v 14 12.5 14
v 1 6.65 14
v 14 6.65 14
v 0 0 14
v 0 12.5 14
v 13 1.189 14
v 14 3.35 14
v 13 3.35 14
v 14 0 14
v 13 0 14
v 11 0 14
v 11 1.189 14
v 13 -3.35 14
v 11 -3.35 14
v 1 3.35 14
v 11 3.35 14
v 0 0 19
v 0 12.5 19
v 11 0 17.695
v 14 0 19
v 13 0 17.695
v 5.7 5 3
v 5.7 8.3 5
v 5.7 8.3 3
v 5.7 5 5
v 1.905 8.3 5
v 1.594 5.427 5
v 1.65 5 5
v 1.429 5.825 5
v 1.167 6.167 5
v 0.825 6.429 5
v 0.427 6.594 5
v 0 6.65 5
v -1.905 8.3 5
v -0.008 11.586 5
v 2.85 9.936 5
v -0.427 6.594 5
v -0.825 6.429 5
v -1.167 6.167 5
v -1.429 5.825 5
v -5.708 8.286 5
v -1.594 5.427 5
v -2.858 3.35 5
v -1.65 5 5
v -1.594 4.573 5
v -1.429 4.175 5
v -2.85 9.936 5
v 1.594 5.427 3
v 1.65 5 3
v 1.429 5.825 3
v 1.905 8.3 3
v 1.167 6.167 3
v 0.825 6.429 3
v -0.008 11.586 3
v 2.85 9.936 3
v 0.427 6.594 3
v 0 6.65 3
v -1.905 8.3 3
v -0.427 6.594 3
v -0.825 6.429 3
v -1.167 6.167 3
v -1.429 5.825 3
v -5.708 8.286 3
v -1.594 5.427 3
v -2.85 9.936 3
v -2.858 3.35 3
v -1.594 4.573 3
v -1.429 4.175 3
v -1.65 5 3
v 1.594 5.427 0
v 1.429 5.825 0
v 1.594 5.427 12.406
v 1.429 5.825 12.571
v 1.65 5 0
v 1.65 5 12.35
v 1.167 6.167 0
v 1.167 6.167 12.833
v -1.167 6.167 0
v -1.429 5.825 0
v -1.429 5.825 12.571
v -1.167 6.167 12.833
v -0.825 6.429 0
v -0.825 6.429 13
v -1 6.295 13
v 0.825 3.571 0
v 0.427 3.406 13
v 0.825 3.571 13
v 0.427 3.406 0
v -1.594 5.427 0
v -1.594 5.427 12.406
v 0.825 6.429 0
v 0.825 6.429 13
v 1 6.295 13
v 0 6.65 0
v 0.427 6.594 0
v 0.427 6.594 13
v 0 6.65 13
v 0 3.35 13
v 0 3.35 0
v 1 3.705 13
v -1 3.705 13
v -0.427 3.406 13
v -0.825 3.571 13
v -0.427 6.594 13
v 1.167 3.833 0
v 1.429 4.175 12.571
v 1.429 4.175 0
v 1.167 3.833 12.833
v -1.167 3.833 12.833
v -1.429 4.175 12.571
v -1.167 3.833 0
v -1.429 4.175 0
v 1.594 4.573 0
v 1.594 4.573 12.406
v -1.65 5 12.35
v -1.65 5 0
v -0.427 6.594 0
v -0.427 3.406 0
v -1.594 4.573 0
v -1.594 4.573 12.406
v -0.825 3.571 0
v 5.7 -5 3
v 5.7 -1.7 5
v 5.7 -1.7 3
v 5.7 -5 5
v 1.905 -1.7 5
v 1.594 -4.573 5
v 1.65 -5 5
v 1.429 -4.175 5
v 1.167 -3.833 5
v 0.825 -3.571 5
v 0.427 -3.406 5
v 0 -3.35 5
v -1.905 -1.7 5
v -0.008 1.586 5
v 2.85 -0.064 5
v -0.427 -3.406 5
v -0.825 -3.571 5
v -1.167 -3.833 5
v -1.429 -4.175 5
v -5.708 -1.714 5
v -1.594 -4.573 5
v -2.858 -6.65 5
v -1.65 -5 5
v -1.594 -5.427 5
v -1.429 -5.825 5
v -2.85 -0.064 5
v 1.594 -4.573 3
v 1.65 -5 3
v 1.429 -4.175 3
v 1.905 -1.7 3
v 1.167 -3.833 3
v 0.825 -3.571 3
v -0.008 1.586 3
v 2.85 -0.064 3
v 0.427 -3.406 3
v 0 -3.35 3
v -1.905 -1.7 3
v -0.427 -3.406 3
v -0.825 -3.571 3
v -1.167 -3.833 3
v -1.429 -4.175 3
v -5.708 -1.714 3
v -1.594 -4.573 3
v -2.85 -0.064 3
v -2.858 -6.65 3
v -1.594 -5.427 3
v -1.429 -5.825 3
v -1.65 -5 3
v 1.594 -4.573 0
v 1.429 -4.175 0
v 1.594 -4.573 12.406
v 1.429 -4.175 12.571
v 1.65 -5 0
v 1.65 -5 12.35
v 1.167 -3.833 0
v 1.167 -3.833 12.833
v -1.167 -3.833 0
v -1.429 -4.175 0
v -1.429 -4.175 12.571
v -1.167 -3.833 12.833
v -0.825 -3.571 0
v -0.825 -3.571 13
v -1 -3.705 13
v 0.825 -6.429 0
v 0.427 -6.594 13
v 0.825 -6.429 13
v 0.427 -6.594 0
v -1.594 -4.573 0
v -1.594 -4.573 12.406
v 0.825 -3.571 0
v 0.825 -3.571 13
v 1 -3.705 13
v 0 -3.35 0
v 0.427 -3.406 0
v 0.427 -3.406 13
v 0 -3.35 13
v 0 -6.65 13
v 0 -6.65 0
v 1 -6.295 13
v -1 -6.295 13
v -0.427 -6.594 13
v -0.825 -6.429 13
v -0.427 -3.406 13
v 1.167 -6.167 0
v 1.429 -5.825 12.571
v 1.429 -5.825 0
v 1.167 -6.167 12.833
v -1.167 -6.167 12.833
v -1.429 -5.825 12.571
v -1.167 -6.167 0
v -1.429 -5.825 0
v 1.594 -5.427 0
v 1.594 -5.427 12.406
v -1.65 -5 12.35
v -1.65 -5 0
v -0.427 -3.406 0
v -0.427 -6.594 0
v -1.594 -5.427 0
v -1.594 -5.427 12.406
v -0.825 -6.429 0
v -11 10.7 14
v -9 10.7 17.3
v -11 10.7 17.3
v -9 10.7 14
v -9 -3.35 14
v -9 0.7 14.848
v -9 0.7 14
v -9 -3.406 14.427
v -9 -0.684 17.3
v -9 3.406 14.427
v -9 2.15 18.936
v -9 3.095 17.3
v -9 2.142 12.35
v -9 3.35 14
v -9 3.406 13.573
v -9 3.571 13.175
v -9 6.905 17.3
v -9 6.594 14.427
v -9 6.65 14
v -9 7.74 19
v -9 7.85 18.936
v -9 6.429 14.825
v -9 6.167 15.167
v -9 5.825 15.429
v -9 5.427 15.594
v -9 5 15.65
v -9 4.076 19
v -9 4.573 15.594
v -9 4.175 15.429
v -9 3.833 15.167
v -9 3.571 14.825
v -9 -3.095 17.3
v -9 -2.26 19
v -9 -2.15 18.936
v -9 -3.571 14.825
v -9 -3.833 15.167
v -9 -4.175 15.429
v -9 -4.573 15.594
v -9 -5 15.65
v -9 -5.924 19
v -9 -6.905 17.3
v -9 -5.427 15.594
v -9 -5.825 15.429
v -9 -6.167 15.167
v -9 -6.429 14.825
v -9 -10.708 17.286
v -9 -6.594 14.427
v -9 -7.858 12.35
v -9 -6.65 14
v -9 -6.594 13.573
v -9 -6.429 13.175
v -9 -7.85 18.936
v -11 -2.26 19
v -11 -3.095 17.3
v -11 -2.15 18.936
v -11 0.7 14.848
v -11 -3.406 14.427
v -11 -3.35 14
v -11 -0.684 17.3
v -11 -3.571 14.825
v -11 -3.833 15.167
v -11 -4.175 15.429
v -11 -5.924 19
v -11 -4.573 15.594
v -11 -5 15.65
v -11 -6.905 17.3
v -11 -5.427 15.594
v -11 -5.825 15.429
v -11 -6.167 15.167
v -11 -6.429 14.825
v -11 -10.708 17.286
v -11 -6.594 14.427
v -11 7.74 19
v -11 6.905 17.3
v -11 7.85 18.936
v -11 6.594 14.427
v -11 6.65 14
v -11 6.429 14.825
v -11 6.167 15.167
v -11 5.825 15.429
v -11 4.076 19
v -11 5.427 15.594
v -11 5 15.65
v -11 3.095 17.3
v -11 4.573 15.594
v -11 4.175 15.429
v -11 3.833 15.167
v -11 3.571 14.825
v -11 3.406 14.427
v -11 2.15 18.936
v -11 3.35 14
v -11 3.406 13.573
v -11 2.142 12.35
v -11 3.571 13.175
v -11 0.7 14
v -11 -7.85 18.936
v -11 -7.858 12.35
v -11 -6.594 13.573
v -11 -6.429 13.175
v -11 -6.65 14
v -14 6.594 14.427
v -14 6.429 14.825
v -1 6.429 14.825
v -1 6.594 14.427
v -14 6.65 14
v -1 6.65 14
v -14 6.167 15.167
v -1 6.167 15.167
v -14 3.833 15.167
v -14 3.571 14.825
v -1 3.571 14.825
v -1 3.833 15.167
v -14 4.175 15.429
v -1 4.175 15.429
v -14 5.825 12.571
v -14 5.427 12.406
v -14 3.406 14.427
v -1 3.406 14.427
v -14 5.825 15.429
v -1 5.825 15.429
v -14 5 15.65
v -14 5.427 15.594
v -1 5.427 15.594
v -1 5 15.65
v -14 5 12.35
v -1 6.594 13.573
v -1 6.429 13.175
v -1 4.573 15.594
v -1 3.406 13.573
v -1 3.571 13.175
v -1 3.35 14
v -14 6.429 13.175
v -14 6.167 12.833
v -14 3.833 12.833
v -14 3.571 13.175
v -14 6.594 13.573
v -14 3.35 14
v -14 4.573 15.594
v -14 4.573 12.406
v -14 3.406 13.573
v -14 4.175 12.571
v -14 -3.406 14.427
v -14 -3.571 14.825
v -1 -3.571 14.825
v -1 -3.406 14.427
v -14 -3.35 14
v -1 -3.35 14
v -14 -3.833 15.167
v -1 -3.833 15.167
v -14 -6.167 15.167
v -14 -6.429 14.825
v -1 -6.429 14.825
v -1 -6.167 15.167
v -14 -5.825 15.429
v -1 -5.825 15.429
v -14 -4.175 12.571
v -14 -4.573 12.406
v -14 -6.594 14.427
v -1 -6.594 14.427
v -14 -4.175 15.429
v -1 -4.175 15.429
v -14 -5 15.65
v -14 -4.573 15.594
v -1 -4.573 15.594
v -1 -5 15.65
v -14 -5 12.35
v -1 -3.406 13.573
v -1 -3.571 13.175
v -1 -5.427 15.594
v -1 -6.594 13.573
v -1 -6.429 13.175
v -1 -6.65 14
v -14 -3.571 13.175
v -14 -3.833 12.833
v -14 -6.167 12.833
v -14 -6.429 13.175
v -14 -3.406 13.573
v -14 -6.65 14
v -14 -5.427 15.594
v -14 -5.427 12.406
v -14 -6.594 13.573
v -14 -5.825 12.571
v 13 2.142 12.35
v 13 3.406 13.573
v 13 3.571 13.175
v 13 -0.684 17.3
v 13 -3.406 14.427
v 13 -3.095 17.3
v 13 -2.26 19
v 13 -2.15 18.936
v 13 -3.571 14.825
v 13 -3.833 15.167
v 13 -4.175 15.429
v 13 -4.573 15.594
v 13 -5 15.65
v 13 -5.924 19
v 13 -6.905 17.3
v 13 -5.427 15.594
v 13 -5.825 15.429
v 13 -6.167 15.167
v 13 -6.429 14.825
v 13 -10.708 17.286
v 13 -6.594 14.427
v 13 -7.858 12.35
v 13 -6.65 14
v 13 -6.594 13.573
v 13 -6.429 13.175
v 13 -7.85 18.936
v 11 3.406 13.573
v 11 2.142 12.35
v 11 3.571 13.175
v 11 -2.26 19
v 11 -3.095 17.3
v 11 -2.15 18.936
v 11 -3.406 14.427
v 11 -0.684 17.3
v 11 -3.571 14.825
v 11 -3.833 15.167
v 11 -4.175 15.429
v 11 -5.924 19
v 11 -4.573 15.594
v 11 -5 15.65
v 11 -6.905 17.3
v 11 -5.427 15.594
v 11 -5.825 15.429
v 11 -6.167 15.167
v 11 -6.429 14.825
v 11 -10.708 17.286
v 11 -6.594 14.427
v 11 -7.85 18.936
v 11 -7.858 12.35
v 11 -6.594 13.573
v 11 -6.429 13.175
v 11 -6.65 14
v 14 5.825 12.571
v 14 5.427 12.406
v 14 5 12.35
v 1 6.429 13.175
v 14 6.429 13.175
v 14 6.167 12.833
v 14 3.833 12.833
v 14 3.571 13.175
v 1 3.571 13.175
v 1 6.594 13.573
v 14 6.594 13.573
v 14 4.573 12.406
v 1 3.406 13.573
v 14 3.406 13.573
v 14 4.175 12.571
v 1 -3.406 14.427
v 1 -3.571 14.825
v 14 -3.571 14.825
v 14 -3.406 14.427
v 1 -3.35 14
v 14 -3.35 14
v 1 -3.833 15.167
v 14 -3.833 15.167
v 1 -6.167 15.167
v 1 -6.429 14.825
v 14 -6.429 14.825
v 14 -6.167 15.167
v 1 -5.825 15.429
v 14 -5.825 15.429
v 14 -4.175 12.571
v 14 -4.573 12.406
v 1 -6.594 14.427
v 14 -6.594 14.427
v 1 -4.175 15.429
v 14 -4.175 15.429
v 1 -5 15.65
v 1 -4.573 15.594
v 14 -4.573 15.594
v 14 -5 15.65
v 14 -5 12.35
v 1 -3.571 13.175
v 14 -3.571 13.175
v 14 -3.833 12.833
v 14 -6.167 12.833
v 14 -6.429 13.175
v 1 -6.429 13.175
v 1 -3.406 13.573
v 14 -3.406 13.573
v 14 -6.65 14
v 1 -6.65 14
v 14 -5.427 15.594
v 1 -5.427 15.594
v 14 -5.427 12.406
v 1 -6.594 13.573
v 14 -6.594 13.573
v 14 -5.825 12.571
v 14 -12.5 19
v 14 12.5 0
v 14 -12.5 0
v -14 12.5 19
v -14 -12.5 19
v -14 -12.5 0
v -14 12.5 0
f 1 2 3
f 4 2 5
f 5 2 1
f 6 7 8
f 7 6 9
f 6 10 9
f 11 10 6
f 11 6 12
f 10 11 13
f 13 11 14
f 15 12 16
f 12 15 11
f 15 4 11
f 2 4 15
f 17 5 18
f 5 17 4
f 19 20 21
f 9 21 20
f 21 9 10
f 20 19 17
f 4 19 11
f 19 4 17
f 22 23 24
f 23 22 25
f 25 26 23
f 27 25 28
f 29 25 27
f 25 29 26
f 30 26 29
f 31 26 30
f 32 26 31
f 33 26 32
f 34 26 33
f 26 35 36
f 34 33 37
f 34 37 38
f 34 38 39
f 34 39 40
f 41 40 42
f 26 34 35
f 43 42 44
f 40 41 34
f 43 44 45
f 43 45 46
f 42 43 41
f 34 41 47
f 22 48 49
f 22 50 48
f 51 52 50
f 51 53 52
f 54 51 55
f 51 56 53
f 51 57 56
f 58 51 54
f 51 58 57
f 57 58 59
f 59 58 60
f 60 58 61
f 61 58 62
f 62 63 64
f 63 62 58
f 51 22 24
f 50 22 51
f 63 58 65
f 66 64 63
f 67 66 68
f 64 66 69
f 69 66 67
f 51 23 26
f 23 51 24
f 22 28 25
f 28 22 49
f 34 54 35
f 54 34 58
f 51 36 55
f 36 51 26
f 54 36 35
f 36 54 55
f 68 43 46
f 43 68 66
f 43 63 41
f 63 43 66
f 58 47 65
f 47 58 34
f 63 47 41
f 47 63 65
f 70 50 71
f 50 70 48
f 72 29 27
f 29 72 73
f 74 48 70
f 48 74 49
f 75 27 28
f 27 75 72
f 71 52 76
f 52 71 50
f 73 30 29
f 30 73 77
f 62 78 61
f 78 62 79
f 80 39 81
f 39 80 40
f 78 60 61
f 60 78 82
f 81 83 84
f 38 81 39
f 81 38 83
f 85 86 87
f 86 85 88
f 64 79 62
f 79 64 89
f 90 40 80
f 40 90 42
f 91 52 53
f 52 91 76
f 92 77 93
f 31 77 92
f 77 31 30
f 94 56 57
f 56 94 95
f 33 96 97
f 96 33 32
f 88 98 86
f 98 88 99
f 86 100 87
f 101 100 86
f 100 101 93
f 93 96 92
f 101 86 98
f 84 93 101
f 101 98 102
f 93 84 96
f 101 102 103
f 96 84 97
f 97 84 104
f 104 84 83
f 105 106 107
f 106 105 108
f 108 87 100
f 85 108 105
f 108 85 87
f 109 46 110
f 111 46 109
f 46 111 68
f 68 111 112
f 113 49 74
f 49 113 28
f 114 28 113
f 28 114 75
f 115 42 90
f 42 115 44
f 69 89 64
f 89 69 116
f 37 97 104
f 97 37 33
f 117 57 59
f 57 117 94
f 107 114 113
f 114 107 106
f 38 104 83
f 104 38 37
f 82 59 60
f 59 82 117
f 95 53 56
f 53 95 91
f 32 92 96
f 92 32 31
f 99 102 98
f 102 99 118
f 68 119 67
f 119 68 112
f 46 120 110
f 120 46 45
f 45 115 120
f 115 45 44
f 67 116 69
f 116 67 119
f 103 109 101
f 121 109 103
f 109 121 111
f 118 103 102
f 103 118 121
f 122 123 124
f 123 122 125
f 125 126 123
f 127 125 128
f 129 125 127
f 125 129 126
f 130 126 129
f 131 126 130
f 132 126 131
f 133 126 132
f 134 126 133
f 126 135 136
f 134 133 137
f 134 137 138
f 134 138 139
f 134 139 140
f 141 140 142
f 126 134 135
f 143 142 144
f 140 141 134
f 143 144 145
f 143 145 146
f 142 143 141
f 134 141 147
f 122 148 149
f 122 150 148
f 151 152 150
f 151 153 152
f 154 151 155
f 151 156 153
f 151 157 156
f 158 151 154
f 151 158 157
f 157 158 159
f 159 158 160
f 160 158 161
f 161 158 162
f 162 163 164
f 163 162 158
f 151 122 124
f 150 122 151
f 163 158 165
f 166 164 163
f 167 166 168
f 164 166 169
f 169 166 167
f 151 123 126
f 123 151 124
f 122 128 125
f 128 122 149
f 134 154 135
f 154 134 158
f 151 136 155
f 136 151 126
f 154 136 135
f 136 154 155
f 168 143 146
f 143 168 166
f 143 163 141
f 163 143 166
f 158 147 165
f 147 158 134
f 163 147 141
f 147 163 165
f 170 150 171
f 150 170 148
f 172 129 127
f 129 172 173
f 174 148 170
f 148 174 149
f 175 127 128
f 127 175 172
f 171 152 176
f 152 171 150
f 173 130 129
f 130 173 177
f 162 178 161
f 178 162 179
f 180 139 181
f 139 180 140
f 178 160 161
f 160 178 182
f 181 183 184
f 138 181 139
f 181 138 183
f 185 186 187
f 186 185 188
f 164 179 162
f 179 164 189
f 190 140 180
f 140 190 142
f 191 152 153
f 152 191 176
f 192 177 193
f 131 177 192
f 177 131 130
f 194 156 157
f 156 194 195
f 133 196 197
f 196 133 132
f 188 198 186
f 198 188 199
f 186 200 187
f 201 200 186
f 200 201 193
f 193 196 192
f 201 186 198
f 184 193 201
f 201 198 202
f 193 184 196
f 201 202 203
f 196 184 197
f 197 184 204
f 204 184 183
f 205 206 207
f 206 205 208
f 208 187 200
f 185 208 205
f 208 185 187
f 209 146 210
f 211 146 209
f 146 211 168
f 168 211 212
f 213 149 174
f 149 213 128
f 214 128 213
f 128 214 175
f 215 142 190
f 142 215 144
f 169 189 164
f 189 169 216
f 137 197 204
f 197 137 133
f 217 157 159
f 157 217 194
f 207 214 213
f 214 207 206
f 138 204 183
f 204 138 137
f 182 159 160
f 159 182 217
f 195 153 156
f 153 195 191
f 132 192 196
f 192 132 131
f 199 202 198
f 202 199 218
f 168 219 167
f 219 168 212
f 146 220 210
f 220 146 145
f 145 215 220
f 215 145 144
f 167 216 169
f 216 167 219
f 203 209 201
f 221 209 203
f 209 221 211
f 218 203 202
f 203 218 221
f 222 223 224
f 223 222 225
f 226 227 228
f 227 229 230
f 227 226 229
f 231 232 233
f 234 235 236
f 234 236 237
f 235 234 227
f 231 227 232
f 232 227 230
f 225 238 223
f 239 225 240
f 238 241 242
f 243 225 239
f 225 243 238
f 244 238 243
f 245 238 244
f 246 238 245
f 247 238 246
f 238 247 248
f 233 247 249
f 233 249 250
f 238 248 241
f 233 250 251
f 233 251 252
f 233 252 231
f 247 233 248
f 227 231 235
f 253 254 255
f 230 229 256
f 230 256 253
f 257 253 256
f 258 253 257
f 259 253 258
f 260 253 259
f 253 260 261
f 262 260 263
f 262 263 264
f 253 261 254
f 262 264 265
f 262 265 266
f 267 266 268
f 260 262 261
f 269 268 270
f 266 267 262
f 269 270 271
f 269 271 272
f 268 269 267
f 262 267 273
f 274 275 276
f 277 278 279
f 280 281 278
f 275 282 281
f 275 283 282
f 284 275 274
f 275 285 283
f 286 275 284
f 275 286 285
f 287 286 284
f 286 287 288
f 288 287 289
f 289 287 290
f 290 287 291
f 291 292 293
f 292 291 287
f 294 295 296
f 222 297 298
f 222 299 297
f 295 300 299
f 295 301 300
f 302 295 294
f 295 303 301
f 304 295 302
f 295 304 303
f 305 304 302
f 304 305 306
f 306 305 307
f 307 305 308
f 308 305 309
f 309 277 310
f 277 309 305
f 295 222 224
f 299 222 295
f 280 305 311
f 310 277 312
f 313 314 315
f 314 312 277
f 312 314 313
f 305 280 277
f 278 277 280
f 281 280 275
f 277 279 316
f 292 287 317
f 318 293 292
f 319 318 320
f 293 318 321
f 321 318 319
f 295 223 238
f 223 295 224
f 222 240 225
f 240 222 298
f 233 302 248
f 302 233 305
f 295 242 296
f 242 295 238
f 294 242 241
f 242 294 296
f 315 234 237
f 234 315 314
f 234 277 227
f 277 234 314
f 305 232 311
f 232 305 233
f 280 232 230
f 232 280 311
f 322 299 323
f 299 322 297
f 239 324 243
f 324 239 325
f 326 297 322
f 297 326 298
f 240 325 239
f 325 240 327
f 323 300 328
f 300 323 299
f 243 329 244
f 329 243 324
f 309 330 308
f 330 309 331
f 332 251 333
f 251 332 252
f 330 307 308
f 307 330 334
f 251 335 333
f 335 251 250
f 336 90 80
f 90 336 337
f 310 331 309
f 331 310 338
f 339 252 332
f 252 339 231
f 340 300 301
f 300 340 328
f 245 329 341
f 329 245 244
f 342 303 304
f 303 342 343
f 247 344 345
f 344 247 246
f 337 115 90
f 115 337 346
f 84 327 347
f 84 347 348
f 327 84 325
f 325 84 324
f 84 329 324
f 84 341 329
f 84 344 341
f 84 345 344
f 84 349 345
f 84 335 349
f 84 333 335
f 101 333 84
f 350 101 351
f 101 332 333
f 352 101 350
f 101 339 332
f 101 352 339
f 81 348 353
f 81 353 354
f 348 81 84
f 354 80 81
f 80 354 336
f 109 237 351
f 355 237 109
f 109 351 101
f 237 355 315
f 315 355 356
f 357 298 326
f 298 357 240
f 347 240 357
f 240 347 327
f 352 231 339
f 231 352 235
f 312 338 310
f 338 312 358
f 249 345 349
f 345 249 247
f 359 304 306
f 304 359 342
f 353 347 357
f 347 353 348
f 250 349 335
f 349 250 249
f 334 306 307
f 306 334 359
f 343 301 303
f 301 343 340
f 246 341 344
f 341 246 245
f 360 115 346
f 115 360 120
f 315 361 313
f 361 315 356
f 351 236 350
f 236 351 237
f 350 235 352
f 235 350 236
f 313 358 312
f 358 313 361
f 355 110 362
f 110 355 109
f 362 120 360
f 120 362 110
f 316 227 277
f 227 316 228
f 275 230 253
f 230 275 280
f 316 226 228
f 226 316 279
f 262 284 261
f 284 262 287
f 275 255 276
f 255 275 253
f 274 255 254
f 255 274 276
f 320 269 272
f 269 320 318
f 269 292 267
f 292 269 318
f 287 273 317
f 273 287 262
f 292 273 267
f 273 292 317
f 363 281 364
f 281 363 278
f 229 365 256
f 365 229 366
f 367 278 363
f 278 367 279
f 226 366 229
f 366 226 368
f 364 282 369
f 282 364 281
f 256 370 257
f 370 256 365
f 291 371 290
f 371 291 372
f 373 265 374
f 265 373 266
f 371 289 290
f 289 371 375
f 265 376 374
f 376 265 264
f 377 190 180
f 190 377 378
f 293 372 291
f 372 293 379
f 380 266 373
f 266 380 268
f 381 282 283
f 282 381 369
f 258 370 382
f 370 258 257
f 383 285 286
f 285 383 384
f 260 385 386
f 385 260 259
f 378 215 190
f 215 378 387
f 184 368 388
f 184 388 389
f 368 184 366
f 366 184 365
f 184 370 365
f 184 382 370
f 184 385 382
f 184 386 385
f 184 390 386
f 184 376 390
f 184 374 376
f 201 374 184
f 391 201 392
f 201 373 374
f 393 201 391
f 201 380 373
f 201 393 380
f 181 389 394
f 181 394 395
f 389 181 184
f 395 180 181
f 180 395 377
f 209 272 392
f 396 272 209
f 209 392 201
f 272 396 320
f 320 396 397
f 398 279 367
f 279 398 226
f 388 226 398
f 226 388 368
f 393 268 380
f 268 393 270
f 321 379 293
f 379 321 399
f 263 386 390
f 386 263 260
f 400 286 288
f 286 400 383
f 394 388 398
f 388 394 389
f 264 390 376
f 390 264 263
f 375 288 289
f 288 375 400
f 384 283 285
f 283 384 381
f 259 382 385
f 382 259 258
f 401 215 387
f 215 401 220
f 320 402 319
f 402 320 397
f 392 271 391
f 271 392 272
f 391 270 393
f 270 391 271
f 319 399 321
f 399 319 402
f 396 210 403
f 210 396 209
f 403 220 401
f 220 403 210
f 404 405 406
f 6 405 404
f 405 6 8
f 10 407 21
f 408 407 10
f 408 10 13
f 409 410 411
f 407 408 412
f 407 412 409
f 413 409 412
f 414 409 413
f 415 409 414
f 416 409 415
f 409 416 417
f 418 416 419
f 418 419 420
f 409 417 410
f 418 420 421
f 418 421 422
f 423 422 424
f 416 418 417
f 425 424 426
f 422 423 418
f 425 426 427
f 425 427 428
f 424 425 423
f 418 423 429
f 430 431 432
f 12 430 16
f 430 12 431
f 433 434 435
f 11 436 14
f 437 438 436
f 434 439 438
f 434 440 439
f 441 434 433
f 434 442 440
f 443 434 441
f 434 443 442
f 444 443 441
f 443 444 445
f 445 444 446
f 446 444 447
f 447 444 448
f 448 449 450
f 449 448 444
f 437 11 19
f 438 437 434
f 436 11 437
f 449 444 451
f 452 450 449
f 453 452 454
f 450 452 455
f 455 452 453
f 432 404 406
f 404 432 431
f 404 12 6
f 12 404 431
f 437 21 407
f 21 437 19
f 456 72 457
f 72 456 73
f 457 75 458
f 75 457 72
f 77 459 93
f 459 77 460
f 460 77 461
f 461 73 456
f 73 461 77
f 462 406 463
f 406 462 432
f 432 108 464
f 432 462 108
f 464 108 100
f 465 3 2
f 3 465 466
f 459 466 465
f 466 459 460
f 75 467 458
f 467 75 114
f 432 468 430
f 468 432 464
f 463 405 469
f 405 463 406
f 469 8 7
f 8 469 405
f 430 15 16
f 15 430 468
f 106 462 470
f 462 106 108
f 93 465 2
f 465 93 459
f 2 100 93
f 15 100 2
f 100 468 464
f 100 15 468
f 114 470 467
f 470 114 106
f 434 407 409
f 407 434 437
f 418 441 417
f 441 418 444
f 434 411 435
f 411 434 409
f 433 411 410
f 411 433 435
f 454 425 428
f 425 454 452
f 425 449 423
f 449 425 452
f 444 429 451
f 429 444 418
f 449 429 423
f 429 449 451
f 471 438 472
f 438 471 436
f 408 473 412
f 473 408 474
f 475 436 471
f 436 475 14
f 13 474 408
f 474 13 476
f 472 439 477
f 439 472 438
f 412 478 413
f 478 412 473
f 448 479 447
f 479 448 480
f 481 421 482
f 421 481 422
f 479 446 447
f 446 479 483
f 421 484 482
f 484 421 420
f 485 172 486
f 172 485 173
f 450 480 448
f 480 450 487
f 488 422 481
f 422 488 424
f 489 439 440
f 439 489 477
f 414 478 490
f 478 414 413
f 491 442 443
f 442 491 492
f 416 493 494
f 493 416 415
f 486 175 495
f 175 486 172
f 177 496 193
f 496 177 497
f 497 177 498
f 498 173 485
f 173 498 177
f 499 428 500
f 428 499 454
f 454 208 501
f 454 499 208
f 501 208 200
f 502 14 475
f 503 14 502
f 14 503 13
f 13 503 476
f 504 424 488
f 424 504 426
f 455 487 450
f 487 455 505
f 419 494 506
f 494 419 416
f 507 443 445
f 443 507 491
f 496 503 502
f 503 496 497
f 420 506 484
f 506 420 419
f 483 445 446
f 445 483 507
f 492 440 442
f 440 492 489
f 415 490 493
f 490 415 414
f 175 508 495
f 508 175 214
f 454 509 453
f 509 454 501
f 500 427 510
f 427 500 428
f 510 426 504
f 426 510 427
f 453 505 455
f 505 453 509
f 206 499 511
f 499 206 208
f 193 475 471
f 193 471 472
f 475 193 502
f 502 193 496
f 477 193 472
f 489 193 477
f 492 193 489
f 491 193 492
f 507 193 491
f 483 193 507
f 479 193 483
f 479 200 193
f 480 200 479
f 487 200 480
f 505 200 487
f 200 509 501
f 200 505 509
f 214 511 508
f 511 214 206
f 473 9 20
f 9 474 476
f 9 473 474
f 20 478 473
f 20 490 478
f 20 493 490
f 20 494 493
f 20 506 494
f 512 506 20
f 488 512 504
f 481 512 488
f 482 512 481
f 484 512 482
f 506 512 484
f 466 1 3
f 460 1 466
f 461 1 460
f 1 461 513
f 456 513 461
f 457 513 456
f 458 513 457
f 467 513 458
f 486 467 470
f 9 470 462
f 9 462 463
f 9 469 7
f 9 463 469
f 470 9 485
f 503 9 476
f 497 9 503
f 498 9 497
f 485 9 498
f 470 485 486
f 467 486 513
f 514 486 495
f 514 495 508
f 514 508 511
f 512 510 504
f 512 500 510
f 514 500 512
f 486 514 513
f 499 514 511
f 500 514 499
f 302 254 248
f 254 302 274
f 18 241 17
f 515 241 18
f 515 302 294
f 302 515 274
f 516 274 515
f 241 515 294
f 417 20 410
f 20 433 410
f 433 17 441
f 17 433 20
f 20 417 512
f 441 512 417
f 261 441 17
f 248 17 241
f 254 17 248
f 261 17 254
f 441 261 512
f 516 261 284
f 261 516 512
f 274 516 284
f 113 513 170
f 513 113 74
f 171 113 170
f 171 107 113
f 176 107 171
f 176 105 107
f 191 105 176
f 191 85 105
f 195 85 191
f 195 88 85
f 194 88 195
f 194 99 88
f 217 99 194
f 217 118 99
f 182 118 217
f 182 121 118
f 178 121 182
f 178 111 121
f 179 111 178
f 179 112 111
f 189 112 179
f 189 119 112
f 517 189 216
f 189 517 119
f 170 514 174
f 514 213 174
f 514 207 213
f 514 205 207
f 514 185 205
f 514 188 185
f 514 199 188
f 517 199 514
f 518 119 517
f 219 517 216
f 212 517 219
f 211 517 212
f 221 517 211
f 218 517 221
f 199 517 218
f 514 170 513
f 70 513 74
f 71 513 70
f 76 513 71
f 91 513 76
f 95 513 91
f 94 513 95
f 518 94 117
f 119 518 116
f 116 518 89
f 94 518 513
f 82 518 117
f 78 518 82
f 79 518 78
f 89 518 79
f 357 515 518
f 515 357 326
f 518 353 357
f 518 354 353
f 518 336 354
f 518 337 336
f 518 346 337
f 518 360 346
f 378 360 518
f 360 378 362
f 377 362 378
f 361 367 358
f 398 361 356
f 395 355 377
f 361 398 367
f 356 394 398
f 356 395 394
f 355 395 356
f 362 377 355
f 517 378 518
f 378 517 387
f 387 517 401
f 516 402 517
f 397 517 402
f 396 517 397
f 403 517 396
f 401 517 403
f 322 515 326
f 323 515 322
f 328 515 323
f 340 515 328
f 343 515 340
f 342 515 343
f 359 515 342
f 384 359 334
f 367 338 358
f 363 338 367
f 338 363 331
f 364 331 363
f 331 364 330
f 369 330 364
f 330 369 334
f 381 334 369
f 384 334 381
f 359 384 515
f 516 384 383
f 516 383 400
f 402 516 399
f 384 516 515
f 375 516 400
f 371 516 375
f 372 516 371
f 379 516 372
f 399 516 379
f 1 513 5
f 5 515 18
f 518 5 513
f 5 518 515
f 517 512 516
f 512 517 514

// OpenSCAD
module bolt () {
  width = 5.7;
  edge = 3.3;
  cube([width,edge,2],1);
  rotate([0,0,60]) { cube([width,edge,2],1);}
  rotate([0,0,120]) { cube([width,edge,2],1); }
  cylinder(20,3.3/2,3.3/2,center=true,$fn=24);
}

module box ( x, y, z ) {
    translate( [-x/2, -y/2, 0] ) {
        cube( [x,y,z] );
    }
}

difference() {

    box(28,25,19);

    translate([0,0,14]) {
        union() {
            cube([12,50,12],1);
            cube([11,21,20],1);
            cube([20,21,11],1);
        }
    }

    translate([0,5,3]) { bolt(); }
    translate([0,-5,3]) { bolt(); }

  translate([-11,5,14]) { rotate([0,0,90]) { rotate([90,0,0]) { bolt(); }} }
  translate([-11,-5,14]) { rotate([0,0,90]) { rotate([90,0,0]) { bolt(); }} }
  translate([11,5,14]) { rotate([0,0,90]) { rotate([90,0,0]) { bolt(); }} }
  translate([11,-5,14]) { rotate([0,0,90]) { rotate([90,0,0]) { bolt(); }} }
}
